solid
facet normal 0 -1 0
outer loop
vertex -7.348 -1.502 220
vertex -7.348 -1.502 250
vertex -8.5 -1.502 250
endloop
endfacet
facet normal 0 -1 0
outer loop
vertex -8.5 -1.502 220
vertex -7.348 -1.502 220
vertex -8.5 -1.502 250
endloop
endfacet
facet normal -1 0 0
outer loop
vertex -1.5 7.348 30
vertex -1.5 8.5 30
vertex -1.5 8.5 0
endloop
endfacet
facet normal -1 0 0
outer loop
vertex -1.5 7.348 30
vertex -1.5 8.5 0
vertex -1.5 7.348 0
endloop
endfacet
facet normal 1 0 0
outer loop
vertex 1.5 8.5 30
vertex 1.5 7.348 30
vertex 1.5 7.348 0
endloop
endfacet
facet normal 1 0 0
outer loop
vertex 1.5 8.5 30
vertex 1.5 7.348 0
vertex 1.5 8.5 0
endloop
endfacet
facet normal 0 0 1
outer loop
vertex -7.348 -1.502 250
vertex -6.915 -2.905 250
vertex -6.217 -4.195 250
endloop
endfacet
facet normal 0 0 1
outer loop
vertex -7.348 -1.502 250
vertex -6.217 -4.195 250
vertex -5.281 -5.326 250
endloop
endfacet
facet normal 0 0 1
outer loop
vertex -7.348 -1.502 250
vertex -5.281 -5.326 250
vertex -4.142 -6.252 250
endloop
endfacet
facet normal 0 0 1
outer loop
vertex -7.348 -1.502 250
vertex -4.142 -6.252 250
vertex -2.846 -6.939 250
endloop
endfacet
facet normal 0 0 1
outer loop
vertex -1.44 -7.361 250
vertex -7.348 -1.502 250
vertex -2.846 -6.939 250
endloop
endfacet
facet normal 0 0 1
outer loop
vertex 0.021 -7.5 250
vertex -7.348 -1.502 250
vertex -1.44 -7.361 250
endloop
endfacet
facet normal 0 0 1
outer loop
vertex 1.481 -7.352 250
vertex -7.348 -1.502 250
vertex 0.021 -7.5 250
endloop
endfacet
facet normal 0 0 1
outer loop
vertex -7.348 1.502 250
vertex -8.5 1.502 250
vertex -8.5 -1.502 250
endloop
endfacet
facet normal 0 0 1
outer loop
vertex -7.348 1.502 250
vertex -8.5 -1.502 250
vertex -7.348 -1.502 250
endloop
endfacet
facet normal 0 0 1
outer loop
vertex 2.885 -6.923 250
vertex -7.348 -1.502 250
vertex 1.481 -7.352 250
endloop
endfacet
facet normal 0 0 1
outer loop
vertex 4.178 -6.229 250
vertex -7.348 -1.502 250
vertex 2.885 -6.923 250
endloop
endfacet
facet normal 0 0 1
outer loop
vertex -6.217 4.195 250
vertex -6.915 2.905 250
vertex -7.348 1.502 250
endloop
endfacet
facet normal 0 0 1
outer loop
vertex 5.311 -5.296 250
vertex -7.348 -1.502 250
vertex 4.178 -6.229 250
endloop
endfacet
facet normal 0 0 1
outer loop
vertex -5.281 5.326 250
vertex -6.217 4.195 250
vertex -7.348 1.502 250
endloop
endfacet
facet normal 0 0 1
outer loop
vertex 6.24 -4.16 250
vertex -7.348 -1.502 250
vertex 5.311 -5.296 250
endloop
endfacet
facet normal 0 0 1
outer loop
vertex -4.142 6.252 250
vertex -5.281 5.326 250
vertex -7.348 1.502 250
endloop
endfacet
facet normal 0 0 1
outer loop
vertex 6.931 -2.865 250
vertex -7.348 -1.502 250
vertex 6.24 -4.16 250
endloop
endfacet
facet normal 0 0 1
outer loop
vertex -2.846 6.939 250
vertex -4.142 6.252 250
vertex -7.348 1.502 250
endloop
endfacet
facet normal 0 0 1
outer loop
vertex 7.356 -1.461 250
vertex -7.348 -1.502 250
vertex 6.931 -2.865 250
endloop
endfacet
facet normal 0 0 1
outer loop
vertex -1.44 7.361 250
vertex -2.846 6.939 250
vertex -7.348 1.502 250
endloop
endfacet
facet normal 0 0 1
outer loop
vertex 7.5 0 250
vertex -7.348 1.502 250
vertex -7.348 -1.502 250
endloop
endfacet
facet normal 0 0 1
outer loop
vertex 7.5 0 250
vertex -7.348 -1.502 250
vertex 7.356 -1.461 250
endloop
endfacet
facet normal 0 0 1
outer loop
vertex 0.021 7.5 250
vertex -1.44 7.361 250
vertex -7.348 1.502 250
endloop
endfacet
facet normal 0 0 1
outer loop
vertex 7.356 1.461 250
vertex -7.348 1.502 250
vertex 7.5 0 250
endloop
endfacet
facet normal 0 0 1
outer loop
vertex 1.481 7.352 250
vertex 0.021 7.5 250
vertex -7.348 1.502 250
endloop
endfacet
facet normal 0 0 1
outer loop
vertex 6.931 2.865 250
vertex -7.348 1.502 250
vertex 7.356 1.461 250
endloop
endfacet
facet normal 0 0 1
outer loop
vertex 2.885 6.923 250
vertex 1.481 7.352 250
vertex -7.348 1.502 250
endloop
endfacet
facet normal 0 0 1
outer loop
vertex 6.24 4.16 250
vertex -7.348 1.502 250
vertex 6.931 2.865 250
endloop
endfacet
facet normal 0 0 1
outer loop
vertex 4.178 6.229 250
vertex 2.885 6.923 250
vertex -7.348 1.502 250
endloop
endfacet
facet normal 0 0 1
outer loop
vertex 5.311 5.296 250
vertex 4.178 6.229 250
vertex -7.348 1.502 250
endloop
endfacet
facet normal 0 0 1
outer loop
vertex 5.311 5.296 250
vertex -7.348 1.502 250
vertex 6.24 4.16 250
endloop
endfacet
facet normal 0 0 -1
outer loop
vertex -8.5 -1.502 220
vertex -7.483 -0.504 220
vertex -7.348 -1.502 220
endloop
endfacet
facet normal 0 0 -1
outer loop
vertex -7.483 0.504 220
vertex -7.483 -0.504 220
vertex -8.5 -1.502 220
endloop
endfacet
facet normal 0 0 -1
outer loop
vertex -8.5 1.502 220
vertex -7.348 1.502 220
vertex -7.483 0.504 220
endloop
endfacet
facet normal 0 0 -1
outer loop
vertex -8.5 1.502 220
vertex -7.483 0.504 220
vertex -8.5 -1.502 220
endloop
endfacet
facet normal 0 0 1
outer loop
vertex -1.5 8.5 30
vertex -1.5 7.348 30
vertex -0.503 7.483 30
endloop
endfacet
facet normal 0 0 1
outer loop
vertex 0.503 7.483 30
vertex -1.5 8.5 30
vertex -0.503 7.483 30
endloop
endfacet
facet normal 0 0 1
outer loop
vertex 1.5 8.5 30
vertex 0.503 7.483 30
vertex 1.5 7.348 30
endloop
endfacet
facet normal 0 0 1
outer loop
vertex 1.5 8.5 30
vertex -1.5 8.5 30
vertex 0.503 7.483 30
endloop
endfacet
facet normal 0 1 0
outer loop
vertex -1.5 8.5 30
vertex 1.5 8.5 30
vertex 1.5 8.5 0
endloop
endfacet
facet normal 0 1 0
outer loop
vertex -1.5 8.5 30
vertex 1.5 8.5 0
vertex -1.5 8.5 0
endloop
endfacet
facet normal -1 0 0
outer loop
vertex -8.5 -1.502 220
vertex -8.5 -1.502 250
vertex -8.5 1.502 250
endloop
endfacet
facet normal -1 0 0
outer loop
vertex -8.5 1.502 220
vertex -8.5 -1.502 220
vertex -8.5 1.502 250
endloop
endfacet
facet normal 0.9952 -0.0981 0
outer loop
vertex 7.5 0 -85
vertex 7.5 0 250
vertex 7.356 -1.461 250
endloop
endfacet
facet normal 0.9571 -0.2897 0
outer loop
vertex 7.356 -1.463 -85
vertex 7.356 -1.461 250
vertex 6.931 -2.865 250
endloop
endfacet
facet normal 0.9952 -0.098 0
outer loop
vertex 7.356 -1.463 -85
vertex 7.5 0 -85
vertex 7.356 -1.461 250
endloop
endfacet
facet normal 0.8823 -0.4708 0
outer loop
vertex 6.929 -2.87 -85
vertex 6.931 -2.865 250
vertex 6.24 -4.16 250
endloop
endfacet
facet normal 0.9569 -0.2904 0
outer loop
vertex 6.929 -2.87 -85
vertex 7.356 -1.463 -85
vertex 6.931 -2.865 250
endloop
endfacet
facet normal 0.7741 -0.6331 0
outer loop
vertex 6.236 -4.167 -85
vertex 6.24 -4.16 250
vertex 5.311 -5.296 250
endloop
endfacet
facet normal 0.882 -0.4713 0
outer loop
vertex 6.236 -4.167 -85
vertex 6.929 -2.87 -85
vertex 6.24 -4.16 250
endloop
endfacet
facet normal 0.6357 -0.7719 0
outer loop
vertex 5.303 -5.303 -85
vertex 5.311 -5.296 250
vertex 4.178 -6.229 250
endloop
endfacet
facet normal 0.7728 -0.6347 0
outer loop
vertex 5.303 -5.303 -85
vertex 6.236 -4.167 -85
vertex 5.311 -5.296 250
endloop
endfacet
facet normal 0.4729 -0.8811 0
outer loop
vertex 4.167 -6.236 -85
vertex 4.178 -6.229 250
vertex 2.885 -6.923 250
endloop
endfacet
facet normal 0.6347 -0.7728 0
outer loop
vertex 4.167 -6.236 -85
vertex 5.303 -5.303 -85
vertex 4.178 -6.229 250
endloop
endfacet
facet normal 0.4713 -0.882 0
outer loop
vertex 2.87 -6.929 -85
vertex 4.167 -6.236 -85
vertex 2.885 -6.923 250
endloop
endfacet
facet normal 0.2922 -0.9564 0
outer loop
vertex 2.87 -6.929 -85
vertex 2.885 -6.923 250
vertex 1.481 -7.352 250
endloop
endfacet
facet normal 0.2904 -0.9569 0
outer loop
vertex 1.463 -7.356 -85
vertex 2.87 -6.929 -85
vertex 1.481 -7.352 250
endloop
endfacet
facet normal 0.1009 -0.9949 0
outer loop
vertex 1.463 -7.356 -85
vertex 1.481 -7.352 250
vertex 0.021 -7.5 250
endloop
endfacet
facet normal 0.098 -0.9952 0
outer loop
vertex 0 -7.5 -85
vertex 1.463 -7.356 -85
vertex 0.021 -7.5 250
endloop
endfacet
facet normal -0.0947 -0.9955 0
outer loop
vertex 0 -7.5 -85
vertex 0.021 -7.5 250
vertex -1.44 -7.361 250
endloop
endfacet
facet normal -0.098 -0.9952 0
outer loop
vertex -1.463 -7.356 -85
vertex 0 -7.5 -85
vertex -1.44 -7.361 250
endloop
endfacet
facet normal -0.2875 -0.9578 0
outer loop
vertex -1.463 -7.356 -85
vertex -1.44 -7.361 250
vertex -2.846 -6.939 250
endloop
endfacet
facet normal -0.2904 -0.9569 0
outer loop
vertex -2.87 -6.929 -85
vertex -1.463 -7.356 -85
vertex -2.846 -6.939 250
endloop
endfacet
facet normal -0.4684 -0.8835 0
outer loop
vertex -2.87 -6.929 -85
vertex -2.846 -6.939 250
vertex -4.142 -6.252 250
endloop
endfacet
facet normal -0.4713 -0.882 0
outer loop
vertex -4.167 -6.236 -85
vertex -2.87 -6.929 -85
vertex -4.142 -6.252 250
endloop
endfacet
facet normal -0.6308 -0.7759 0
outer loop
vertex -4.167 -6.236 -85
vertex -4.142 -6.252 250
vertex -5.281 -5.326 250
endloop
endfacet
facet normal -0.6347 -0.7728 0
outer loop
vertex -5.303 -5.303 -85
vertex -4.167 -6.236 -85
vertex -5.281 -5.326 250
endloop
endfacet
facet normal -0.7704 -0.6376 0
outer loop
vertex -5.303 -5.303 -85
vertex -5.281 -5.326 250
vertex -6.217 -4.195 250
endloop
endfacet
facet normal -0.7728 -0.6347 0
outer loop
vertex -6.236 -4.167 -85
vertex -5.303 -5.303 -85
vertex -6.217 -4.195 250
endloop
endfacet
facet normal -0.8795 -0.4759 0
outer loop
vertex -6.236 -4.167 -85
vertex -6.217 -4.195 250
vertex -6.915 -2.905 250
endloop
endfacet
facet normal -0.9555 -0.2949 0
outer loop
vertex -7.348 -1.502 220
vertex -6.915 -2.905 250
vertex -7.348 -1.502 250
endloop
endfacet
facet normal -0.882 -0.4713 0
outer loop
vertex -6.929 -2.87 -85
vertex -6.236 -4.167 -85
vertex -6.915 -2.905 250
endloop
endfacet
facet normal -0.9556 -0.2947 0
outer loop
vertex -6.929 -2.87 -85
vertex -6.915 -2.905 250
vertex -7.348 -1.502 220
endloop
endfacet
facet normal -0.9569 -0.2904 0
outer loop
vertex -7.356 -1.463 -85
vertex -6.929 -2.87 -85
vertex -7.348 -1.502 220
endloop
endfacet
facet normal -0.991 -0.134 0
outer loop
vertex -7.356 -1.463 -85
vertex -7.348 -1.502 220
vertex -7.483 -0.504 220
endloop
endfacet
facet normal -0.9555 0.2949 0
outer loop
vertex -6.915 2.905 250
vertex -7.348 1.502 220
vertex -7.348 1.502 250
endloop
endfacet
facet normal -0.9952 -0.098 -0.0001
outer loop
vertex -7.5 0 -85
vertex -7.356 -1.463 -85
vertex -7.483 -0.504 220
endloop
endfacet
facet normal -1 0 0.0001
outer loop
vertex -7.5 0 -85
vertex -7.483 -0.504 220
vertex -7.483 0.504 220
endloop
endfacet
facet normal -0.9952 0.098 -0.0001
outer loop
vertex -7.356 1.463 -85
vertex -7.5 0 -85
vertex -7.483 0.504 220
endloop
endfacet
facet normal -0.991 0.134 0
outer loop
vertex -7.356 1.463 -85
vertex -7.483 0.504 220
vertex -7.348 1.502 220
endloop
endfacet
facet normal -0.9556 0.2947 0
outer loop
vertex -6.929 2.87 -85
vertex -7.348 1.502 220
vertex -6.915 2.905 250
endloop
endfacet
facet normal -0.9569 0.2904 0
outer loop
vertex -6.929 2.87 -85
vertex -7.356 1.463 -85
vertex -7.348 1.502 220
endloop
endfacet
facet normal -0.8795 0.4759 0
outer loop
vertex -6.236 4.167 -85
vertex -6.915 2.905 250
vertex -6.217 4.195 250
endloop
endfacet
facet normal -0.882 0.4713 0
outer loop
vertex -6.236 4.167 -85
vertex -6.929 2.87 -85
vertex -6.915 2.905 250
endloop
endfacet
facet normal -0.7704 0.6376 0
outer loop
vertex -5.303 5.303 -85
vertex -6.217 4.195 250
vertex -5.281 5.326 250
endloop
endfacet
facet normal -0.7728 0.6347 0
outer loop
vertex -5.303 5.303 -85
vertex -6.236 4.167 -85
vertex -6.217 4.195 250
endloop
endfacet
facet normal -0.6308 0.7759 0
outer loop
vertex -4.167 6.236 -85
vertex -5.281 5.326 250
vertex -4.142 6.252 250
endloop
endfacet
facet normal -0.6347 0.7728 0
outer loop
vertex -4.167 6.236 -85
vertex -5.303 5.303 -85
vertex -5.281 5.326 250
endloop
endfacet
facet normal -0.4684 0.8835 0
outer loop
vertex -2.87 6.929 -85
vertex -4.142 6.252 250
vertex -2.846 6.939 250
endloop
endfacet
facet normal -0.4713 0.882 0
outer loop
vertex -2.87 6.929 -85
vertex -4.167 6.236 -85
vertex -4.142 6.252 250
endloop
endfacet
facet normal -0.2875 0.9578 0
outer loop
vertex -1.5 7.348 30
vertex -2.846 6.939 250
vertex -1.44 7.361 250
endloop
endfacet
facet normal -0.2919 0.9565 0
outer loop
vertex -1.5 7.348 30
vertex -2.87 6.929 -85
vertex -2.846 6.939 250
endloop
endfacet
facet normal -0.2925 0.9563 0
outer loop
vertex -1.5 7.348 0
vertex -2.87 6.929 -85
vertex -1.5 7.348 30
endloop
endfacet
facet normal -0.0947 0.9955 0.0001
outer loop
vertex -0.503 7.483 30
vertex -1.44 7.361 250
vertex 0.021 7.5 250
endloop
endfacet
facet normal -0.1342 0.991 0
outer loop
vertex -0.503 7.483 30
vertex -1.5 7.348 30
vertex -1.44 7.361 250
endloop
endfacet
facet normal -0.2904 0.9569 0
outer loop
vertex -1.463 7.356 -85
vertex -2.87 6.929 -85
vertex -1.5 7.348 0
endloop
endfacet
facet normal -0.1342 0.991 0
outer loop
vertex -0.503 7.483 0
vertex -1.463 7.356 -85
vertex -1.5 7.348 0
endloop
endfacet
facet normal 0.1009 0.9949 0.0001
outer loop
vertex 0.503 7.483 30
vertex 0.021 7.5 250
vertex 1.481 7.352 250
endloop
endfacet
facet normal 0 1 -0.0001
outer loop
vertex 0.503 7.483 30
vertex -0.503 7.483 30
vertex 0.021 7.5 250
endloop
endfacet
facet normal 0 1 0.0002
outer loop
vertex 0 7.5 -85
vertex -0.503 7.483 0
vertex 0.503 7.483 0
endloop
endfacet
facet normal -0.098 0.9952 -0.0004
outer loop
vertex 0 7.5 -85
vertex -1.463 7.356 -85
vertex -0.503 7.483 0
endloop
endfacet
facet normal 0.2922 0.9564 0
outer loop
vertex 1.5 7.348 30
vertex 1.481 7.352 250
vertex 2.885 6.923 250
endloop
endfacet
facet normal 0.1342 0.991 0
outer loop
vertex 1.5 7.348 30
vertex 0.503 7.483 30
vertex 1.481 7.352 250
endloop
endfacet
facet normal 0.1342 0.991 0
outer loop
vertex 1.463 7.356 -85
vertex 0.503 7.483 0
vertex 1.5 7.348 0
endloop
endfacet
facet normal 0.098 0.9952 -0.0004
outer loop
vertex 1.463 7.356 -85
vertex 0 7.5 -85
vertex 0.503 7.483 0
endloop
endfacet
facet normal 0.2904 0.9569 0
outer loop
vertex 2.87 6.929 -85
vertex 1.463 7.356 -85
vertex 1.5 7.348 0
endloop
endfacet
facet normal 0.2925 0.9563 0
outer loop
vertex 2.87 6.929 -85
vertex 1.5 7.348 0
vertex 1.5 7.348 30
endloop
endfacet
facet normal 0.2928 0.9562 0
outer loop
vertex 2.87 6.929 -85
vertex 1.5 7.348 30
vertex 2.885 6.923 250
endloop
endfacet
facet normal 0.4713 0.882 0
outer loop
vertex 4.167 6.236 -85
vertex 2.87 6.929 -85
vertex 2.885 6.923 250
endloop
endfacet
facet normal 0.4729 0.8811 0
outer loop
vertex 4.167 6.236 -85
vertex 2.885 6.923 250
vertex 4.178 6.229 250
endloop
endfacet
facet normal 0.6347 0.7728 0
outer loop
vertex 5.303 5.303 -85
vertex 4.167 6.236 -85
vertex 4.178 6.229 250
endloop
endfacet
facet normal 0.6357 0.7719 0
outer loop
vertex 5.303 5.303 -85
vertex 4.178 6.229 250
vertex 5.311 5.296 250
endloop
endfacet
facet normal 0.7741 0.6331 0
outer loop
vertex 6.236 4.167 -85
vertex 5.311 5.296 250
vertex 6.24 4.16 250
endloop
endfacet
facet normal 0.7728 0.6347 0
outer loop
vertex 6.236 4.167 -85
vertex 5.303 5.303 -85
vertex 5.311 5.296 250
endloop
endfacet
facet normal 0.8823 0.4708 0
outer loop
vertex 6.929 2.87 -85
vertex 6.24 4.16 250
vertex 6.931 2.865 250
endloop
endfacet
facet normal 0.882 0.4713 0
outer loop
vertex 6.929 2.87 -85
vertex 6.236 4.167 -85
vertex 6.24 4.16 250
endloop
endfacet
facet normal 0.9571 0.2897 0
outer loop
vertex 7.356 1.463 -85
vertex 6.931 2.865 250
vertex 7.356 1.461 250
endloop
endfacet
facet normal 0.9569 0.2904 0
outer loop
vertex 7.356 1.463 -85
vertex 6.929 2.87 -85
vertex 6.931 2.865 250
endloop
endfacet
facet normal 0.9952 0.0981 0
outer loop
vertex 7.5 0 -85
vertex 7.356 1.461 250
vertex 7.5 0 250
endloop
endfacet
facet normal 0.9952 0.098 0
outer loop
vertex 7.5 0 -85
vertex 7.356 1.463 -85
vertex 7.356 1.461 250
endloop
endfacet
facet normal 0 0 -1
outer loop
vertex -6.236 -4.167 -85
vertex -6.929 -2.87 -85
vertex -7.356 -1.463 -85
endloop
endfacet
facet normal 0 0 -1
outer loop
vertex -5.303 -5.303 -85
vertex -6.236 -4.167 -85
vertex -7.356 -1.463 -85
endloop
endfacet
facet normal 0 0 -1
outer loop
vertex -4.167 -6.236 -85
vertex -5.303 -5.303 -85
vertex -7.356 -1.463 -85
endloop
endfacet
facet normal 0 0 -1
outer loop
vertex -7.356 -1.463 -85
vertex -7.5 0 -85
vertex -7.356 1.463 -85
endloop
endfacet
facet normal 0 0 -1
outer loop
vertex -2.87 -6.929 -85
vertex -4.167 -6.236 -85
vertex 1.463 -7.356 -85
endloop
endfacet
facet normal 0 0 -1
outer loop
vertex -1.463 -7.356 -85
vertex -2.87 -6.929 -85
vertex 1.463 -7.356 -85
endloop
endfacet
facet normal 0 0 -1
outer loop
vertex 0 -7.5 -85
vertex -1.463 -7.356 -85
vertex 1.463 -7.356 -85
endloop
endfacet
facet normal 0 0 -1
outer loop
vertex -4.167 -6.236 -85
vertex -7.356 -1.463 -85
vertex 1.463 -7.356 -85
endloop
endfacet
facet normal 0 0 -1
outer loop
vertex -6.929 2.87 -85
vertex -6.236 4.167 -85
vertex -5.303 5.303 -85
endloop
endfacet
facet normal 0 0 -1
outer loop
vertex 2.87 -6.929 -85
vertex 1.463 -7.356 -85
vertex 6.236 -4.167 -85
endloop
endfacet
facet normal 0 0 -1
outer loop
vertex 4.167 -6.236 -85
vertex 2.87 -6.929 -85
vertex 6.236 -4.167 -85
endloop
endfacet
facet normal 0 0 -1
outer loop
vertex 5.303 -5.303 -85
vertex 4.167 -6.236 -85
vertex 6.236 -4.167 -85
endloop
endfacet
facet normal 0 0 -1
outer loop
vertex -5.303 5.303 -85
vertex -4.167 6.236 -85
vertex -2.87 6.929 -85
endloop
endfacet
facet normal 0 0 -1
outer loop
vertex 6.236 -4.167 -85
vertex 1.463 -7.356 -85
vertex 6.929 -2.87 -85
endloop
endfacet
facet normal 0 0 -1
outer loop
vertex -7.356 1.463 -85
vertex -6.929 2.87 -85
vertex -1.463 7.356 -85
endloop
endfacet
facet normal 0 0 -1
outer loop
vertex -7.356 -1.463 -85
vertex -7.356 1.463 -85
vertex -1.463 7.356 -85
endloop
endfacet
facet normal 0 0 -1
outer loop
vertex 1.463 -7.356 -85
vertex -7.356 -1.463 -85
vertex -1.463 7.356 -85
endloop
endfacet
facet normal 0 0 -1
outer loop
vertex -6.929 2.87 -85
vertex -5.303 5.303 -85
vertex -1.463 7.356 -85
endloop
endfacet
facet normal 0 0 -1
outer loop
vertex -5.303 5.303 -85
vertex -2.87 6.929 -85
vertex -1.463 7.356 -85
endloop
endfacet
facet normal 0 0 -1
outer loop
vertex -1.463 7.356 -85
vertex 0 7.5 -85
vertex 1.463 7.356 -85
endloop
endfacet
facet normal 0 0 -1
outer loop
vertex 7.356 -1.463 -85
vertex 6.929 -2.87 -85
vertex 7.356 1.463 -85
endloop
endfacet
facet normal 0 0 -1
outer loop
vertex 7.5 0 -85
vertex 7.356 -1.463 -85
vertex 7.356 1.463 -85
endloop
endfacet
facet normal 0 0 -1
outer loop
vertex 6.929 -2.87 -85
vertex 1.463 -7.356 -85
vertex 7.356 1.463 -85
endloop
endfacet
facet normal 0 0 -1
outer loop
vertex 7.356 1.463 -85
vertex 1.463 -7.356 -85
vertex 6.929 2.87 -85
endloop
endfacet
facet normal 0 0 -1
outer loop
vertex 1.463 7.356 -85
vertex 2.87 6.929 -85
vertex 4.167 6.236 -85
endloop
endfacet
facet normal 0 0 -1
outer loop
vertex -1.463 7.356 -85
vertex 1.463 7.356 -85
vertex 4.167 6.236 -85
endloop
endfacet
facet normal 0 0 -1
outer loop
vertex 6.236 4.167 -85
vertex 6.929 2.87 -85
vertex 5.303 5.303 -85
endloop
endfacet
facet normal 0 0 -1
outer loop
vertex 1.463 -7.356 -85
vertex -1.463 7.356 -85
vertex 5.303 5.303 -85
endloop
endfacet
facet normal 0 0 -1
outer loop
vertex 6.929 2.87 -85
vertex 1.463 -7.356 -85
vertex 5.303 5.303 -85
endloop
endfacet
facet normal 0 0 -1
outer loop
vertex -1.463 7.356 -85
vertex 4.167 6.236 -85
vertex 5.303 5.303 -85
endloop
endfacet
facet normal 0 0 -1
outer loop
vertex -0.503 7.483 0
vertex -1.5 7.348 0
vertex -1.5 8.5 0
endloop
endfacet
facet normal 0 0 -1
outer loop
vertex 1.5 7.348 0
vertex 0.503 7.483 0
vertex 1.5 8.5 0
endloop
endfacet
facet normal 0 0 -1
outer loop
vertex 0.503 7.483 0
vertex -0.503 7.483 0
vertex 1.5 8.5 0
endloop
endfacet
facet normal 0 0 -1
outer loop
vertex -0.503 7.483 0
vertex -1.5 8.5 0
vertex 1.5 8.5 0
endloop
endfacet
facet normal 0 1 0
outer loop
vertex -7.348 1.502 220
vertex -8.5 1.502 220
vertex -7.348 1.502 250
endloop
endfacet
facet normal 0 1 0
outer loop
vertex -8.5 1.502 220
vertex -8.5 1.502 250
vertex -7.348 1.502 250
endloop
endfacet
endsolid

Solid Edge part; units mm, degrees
sketch "Sketch1" plane through (0, 0, 0) normal (0, 0, 1) x (1, 0, 0)
  circle A0 centre (0, 0) radius 7.5
  dimension "D1" = 15
extrude "ExtrudedProtrusion_1" add sketch "Sketch1" along normal blind 250 and the other way blind 85
sketch "Sketch2" plane through (0, 0, 0) normal (0, 0, 1) x (1, 0, 0)
  line L0 (-1.5, 6.5) -> (1.5, 6.5)
  line L1 (1.5, 6.5) -> (1.5, 8.5)
  line L2 (1.5, 8.5) -> (-1.5, 8.5)
  line L3 (-1.5, 8.5) -> (-1.5, 6.5)
  dimension "D1" = 6.5
  dimension "D2" = 3
extrude "ExtrudedProtrusion_2" add sketch "Sketch2" along normal blind 30
sketch "Sketch3" plane through (0, 0, 250) normal (0, 0, 1) x (0, 1, 0)
  line L0 (1.5023, 6.5) -> (-1.5023, 6.5)
  line L1 (-1.5023, 6.5) -> (-1.5023, 8.5)
  line L2 (-1.5023, 8.5) -> (1.5023, 8.5)
  line L3 (1.5023, 8.5) -> (1.5023, 6.5)
  dimension "D1" = 3.0045
  dimension "D2" = 2
  dimension "D3" = 6.5
extrude "ExtrudedProtrusion_3" add sketch "Sketch3" against normal blind 30
properties material "Aluminum, 1060"
